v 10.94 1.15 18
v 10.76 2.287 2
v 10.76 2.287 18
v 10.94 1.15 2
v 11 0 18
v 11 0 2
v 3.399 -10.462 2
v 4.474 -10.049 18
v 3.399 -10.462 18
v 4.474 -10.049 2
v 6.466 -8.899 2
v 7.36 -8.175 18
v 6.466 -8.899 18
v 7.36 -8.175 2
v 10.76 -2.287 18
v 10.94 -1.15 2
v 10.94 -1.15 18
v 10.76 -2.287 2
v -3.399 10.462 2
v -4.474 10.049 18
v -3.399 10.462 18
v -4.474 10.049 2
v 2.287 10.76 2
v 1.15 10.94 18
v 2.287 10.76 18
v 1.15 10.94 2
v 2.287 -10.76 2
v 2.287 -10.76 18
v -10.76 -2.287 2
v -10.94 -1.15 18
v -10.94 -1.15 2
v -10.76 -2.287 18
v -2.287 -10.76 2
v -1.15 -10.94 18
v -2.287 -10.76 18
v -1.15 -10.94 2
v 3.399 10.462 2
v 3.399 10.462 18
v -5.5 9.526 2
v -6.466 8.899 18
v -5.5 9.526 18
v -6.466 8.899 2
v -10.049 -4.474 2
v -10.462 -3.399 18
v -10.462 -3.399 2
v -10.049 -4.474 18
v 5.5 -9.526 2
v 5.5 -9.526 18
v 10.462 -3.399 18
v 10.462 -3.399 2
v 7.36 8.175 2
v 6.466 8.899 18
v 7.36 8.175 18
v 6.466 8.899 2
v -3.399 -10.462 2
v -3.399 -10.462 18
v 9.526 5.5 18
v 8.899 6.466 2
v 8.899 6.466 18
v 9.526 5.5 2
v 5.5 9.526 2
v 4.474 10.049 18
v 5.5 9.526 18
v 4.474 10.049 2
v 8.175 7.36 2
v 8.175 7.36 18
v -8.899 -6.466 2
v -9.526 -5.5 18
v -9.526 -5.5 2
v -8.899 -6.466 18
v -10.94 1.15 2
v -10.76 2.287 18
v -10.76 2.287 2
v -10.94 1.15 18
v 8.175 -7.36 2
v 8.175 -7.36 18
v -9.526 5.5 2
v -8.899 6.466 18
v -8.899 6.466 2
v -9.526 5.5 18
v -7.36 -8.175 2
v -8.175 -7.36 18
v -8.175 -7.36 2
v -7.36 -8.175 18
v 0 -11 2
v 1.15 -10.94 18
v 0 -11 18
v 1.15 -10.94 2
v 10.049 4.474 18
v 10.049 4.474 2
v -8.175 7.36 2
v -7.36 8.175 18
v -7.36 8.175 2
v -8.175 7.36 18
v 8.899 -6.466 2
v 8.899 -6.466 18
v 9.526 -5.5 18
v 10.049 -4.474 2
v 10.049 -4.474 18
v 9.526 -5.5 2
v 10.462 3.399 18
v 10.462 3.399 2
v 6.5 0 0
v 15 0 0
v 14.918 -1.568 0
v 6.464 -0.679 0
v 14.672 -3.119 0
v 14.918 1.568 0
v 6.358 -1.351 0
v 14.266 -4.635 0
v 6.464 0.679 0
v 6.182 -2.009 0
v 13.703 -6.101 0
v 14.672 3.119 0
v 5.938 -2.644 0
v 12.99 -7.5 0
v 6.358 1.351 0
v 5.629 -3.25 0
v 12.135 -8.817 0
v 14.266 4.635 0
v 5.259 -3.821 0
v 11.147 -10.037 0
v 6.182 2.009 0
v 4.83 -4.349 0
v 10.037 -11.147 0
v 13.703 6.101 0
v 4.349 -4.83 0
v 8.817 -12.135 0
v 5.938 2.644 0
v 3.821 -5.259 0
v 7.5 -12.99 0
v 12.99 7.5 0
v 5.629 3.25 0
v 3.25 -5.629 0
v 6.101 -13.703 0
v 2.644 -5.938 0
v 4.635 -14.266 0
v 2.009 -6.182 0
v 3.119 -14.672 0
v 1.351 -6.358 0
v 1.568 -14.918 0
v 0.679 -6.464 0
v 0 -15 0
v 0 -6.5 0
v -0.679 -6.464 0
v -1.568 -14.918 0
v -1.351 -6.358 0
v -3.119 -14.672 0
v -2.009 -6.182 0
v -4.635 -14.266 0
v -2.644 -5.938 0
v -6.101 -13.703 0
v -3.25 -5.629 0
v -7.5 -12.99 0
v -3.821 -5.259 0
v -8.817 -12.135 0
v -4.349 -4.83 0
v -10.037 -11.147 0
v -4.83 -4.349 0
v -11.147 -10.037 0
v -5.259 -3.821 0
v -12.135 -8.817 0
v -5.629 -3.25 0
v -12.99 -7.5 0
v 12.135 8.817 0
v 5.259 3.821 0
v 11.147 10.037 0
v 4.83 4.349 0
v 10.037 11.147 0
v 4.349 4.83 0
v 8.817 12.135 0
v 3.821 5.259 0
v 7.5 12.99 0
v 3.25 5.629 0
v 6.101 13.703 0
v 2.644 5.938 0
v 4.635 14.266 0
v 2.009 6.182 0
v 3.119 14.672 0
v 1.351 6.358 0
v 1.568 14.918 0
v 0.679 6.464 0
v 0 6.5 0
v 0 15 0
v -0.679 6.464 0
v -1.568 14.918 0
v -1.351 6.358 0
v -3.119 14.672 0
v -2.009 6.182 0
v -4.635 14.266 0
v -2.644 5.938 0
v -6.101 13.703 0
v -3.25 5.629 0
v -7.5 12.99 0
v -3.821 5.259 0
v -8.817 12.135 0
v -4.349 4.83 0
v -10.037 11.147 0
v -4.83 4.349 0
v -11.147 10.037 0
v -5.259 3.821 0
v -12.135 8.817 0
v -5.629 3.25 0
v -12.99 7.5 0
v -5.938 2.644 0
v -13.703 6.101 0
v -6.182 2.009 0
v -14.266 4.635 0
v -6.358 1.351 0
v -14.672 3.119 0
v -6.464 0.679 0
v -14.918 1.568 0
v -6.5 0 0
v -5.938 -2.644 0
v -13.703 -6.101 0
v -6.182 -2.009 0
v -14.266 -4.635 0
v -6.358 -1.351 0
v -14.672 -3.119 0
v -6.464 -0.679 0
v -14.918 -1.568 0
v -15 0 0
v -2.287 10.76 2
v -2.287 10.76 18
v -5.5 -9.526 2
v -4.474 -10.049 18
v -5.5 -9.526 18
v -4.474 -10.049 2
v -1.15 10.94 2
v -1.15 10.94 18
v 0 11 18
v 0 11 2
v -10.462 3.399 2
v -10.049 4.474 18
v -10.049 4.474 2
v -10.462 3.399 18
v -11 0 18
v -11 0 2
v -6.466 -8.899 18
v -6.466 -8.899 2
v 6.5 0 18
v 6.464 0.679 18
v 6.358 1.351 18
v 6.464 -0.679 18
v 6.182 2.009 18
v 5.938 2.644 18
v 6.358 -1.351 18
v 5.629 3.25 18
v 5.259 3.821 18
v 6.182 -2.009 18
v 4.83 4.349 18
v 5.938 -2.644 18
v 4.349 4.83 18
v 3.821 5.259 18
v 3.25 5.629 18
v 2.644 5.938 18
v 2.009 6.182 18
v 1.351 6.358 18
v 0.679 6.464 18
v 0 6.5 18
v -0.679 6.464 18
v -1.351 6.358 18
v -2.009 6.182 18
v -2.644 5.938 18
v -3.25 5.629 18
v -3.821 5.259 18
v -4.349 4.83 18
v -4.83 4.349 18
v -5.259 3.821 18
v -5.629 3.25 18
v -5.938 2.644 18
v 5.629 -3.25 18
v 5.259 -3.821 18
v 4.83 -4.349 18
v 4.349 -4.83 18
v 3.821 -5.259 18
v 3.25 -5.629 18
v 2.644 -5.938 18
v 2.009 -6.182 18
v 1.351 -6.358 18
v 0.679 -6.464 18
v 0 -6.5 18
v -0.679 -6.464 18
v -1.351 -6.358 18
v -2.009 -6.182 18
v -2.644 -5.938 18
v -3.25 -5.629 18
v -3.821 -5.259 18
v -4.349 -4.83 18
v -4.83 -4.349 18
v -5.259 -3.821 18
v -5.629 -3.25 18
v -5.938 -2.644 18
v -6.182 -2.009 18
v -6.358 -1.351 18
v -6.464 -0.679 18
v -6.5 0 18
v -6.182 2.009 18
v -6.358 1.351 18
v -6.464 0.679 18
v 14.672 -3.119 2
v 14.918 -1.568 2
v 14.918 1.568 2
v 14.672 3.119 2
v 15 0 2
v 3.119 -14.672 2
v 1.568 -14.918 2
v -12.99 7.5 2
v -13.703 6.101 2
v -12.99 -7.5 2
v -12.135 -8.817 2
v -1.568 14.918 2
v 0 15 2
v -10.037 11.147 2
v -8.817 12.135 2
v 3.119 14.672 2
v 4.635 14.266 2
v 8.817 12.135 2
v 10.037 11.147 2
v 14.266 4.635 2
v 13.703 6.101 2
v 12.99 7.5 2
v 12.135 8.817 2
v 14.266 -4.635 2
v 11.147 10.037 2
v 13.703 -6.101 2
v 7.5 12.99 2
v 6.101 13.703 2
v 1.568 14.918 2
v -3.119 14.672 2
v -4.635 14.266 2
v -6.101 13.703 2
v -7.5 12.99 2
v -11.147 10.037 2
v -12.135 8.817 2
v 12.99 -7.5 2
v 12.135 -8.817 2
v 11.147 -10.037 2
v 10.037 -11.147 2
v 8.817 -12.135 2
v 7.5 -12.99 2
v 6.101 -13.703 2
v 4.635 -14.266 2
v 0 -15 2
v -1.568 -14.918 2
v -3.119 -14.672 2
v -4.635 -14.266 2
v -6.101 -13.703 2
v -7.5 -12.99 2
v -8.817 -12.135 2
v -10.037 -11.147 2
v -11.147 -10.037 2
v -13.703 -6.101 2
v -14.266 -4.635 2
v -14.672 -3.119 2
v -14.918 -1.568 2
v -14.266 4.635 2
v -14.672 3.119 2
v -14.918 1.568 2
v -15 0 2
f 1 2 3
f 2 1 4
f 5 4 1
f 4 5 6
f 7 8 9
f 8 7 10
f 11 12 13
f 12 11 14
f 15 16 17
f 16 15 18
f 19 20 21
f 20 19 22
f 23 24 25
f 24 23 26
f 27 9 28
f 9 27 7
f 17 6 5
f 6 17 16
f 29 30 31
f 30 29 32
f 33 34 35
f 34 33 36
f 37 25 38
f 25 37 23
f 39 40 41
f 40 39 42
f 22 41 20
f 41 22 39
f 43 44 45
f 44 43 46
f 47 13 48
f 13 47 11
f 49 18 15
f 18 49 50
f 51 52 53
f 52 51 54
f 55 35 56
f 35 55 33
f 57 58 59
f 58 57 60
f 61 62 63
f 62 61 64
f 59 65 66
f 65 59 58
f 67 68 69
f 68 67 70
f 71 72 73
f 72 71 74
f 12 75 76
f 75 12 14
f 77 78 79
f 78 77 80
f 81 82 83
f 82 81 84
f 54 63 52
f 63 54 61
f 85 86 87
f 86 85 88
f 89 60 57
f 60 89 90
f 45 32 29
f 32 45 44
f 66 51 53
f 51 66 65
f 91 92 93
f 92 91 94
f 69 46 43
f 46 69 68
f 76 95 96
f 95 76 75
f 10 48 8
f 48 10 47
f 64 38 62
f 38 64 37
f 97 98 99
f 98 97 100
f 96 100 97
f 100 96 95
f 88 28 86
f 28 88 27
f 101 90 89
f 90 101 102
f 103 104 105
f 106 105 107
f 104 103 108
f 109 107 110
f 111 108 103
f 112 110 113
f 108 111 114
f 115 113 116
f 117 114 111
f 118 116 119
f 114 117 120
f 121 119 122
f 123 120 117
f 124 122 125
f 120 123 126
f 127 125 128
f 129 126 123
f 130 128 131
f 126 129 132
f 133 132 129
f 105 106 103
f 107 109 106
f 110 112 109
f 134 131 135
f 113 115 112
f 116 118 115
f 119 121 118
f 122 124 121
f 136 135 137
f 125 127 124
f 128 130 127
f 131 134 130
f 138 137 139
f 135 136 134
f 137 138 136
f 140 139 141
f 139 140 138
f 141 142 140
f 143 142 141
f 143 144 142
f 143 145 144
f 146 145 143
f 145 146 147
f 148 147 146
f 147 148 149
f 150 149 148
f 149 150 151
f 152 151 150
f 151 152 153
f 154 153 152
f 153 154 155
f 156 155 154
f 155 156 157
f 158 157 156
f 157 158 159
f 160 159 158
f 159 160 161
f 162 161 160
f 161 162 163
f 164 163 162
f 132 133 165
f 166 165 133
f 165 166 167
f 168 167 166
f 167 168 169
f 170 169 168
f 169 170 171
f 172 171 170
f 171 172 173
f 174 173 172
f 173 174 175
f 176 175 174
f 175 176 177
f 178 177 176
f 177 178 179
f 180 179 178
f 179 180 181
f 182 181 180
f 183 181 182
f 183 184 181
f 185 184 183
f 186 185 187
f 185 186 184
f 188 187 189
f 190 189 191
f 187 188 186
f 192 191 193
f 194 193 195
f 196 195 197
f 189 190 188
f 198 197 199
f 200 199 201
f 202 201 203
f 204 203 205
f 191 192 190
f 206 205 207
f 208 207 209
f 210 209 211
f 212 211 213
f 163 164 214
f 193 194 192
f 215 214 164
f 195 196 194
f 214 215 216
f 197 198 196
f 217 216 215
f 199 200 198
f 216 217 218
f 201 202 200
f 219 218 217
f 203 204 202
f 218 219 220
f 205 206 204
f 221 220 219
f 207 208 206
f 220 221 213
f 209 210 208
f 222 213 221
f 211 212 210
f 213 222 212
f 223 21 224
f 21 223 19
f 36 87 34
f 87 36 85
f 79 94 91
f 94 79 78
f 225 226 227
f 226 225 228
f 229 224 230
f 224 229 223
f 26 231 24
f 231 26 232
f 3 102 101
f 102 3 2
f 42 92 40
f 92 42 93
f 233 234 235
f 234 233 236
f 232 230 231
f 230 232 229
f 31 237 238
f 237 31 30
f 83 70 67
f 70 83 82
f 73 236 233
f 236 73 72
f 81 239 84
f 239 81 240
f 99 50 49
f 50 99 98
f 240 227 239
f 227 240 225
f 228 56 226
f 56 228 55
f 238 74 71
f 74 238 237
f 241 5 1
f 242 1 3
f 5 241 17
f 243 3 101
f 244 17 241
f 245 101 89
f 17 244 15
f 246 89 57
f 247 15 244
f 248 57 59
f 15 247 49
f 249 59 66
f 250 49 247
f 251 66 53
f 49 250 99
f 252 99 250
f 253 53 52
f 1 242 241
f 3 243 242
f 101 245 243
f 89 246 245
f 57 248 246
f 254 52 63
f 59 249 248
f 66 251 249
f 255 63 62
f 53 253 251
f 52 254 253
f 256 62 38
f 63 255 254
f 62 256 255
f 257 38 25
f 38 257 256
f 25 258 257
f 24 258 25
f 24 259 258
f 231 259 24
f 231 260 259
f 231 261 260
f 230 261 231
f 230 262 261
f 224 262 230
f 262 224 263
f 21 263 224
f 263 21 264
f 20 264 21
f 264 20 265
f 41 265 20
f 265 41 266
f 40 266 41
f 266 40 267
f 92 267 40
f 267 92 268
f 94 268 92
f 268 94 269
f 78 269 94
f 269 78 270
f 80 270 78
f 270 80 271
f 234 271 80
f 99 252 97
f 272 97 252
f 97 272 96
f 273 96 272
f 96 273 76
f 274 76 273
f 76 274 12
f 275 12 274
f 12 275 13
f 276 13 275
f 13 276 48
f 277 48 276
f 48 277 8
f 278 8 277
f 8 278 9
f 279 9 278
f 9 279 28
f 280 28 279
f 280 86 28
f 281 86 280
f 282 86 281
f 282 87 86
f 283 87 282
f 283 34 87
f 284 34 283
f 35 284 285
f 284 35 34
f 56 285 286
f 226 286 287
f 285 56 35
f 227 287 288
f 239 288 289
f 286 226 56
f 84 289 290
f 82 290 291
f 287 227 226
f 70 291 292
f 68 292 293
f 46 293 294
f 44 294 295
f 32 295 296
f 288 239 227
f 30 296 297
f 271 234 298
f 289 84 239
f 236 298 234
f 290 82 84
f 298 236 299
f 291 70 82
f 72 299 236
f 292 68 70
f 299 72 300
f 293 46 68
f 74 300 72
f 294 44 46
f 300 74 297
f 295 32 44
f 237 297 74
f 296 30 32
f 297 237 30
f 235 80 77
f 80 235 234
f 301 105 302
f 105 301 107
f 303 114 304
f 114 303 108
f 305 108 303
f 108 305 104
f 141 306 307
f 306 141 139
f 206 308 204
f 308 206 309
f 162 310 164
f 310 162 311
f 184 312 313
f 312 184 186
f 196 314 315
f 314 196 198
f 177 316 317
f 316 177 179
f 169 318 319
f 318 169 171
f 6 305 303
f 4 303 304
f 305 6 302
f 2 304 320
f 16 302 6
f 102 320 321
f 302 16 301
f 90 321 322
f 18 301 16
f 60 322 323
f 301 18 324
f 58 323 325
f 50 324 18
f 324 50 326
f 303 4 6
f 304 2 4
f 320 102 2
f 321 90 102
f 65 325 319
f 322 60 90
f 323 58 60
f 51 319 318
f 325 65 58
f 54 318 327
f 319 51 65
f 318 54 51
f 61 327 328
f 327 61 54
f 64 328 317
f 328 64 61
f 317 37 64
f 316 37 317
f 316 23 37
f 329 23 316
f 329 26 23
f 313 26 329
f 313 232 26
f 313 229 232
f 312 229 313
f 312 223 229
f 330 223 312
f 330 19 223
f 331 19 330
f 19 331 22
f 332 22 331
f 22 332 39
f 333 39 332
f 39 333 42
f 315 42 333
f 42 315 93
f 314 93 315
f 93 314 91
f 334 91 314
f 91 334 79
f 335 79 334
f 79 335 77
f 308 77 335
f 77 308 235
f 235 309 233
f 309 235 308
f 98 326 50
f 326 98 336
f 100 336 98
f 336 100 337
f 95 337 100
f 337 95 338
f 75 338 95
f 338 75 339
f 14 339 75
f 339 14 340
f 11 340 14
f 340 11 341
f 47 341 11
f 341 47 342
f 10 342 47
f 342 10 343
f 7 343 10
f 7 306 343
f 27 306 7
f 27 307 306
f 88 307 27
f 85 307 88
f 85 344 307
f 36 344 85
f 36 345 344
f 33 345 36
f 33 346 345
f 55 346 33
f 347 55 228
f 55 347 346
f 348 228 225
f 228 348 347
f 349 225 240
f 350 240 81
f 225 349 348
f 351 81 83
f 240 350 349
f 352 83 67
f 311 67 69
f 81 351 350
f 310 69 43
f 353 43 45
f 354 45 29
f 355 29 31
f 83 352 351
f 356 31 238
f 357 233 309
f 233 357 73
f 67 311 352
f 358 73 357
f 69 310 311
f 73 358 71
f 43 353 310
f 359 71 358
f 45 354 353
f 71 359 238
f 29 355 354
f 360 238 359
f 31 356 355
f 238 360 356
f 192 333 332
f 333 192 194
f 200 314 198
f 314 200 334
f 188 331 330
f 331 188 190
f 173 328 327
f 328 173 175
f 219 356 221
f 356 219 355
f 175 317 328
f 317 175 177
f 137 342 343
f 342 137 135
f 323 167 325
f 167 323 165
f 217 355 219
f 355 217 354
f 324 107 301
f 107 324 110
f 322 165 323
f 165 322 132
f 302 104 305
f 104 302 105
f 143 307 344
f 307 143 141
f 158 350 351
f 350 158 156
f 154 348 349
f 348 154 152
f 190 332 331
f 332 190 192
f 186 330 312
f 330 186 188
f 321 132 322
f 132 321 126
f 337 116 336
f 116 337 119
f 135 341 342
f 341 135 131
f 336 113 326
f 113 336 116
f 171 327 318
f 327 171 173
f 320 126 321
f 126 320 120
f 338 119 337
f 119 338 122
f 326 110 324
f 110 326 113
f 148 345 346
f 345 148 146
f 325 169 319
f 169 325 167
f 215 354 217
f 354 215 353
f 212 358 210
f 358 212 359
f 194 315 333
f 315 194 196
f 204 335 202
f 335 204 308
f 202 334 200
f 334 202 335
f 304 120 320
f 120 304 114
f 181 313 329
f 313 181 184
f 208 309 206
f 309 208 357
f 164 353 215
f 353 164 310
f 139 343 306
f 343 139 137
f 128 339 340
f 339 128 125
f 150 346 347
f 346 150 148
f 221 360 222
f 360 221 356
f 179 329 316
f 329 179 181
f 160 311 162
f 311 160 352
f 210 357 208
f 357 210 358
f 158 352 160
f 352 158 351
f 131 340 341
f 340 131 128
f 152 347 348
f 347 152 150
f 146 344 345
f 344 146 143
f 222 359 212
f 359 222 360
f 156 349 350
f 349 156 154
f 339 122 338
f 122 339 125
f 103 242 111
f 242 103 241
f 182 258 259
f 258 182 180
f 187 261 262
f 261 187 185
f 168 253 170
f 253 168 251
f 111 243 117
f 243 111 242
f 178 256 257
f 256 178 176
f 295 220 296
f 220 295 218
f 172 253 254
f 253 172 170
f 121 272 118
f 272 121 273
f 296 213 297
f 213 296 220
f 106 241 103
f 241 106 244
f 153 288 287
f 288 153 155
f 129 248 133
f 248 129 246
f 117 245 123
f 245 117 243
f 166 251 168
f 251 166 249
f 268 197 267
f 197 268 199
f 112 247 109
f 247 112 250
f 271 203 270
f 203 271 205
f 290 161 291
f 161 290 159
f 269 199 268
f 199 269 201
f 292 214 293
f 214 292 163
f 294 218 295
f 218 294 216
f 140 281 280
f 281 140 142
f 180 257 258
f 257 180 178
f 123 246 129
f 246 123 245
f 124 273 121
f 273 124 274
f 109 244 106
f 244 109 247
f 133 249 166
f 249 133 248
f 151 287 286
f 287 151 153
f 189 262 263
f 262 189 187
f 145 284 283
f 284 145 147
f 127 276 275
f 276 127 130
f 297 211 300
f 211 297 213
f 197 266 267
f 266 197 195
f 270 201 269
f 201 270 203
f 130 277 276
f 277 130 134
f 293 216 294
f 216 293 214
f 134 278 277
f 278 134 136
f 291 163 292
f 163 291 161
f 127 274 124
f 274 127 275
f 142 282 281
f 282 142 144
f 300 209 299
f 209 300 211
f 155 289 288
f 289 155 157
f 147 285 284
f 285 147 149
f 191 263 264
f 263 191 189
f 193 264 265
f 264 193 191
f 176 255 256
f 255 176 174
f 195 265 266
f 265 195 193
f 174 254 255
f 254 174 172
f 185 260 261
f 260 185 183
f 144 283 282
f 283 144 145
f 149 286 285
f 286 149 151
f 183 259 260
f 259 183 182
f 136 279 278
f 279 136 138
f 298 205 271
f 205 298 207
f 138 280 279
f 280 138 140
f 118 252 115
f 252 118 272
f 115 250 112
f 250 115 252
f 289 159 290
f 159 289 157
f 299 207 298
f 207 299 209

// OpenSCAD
// Flanged threaded insert.
$fn = 60;
eps = 0.02;
inner_d = 13;
outer_d = 22;
length = 18;
flange_d = 30;
difference() {
    union() { cylinder(d=outer_d,h=length); cylinder(d=flange_d,h=2); }
    translate([0,0,-eps]) cylinder(d=inner_d,h=length+2*eps);
}
